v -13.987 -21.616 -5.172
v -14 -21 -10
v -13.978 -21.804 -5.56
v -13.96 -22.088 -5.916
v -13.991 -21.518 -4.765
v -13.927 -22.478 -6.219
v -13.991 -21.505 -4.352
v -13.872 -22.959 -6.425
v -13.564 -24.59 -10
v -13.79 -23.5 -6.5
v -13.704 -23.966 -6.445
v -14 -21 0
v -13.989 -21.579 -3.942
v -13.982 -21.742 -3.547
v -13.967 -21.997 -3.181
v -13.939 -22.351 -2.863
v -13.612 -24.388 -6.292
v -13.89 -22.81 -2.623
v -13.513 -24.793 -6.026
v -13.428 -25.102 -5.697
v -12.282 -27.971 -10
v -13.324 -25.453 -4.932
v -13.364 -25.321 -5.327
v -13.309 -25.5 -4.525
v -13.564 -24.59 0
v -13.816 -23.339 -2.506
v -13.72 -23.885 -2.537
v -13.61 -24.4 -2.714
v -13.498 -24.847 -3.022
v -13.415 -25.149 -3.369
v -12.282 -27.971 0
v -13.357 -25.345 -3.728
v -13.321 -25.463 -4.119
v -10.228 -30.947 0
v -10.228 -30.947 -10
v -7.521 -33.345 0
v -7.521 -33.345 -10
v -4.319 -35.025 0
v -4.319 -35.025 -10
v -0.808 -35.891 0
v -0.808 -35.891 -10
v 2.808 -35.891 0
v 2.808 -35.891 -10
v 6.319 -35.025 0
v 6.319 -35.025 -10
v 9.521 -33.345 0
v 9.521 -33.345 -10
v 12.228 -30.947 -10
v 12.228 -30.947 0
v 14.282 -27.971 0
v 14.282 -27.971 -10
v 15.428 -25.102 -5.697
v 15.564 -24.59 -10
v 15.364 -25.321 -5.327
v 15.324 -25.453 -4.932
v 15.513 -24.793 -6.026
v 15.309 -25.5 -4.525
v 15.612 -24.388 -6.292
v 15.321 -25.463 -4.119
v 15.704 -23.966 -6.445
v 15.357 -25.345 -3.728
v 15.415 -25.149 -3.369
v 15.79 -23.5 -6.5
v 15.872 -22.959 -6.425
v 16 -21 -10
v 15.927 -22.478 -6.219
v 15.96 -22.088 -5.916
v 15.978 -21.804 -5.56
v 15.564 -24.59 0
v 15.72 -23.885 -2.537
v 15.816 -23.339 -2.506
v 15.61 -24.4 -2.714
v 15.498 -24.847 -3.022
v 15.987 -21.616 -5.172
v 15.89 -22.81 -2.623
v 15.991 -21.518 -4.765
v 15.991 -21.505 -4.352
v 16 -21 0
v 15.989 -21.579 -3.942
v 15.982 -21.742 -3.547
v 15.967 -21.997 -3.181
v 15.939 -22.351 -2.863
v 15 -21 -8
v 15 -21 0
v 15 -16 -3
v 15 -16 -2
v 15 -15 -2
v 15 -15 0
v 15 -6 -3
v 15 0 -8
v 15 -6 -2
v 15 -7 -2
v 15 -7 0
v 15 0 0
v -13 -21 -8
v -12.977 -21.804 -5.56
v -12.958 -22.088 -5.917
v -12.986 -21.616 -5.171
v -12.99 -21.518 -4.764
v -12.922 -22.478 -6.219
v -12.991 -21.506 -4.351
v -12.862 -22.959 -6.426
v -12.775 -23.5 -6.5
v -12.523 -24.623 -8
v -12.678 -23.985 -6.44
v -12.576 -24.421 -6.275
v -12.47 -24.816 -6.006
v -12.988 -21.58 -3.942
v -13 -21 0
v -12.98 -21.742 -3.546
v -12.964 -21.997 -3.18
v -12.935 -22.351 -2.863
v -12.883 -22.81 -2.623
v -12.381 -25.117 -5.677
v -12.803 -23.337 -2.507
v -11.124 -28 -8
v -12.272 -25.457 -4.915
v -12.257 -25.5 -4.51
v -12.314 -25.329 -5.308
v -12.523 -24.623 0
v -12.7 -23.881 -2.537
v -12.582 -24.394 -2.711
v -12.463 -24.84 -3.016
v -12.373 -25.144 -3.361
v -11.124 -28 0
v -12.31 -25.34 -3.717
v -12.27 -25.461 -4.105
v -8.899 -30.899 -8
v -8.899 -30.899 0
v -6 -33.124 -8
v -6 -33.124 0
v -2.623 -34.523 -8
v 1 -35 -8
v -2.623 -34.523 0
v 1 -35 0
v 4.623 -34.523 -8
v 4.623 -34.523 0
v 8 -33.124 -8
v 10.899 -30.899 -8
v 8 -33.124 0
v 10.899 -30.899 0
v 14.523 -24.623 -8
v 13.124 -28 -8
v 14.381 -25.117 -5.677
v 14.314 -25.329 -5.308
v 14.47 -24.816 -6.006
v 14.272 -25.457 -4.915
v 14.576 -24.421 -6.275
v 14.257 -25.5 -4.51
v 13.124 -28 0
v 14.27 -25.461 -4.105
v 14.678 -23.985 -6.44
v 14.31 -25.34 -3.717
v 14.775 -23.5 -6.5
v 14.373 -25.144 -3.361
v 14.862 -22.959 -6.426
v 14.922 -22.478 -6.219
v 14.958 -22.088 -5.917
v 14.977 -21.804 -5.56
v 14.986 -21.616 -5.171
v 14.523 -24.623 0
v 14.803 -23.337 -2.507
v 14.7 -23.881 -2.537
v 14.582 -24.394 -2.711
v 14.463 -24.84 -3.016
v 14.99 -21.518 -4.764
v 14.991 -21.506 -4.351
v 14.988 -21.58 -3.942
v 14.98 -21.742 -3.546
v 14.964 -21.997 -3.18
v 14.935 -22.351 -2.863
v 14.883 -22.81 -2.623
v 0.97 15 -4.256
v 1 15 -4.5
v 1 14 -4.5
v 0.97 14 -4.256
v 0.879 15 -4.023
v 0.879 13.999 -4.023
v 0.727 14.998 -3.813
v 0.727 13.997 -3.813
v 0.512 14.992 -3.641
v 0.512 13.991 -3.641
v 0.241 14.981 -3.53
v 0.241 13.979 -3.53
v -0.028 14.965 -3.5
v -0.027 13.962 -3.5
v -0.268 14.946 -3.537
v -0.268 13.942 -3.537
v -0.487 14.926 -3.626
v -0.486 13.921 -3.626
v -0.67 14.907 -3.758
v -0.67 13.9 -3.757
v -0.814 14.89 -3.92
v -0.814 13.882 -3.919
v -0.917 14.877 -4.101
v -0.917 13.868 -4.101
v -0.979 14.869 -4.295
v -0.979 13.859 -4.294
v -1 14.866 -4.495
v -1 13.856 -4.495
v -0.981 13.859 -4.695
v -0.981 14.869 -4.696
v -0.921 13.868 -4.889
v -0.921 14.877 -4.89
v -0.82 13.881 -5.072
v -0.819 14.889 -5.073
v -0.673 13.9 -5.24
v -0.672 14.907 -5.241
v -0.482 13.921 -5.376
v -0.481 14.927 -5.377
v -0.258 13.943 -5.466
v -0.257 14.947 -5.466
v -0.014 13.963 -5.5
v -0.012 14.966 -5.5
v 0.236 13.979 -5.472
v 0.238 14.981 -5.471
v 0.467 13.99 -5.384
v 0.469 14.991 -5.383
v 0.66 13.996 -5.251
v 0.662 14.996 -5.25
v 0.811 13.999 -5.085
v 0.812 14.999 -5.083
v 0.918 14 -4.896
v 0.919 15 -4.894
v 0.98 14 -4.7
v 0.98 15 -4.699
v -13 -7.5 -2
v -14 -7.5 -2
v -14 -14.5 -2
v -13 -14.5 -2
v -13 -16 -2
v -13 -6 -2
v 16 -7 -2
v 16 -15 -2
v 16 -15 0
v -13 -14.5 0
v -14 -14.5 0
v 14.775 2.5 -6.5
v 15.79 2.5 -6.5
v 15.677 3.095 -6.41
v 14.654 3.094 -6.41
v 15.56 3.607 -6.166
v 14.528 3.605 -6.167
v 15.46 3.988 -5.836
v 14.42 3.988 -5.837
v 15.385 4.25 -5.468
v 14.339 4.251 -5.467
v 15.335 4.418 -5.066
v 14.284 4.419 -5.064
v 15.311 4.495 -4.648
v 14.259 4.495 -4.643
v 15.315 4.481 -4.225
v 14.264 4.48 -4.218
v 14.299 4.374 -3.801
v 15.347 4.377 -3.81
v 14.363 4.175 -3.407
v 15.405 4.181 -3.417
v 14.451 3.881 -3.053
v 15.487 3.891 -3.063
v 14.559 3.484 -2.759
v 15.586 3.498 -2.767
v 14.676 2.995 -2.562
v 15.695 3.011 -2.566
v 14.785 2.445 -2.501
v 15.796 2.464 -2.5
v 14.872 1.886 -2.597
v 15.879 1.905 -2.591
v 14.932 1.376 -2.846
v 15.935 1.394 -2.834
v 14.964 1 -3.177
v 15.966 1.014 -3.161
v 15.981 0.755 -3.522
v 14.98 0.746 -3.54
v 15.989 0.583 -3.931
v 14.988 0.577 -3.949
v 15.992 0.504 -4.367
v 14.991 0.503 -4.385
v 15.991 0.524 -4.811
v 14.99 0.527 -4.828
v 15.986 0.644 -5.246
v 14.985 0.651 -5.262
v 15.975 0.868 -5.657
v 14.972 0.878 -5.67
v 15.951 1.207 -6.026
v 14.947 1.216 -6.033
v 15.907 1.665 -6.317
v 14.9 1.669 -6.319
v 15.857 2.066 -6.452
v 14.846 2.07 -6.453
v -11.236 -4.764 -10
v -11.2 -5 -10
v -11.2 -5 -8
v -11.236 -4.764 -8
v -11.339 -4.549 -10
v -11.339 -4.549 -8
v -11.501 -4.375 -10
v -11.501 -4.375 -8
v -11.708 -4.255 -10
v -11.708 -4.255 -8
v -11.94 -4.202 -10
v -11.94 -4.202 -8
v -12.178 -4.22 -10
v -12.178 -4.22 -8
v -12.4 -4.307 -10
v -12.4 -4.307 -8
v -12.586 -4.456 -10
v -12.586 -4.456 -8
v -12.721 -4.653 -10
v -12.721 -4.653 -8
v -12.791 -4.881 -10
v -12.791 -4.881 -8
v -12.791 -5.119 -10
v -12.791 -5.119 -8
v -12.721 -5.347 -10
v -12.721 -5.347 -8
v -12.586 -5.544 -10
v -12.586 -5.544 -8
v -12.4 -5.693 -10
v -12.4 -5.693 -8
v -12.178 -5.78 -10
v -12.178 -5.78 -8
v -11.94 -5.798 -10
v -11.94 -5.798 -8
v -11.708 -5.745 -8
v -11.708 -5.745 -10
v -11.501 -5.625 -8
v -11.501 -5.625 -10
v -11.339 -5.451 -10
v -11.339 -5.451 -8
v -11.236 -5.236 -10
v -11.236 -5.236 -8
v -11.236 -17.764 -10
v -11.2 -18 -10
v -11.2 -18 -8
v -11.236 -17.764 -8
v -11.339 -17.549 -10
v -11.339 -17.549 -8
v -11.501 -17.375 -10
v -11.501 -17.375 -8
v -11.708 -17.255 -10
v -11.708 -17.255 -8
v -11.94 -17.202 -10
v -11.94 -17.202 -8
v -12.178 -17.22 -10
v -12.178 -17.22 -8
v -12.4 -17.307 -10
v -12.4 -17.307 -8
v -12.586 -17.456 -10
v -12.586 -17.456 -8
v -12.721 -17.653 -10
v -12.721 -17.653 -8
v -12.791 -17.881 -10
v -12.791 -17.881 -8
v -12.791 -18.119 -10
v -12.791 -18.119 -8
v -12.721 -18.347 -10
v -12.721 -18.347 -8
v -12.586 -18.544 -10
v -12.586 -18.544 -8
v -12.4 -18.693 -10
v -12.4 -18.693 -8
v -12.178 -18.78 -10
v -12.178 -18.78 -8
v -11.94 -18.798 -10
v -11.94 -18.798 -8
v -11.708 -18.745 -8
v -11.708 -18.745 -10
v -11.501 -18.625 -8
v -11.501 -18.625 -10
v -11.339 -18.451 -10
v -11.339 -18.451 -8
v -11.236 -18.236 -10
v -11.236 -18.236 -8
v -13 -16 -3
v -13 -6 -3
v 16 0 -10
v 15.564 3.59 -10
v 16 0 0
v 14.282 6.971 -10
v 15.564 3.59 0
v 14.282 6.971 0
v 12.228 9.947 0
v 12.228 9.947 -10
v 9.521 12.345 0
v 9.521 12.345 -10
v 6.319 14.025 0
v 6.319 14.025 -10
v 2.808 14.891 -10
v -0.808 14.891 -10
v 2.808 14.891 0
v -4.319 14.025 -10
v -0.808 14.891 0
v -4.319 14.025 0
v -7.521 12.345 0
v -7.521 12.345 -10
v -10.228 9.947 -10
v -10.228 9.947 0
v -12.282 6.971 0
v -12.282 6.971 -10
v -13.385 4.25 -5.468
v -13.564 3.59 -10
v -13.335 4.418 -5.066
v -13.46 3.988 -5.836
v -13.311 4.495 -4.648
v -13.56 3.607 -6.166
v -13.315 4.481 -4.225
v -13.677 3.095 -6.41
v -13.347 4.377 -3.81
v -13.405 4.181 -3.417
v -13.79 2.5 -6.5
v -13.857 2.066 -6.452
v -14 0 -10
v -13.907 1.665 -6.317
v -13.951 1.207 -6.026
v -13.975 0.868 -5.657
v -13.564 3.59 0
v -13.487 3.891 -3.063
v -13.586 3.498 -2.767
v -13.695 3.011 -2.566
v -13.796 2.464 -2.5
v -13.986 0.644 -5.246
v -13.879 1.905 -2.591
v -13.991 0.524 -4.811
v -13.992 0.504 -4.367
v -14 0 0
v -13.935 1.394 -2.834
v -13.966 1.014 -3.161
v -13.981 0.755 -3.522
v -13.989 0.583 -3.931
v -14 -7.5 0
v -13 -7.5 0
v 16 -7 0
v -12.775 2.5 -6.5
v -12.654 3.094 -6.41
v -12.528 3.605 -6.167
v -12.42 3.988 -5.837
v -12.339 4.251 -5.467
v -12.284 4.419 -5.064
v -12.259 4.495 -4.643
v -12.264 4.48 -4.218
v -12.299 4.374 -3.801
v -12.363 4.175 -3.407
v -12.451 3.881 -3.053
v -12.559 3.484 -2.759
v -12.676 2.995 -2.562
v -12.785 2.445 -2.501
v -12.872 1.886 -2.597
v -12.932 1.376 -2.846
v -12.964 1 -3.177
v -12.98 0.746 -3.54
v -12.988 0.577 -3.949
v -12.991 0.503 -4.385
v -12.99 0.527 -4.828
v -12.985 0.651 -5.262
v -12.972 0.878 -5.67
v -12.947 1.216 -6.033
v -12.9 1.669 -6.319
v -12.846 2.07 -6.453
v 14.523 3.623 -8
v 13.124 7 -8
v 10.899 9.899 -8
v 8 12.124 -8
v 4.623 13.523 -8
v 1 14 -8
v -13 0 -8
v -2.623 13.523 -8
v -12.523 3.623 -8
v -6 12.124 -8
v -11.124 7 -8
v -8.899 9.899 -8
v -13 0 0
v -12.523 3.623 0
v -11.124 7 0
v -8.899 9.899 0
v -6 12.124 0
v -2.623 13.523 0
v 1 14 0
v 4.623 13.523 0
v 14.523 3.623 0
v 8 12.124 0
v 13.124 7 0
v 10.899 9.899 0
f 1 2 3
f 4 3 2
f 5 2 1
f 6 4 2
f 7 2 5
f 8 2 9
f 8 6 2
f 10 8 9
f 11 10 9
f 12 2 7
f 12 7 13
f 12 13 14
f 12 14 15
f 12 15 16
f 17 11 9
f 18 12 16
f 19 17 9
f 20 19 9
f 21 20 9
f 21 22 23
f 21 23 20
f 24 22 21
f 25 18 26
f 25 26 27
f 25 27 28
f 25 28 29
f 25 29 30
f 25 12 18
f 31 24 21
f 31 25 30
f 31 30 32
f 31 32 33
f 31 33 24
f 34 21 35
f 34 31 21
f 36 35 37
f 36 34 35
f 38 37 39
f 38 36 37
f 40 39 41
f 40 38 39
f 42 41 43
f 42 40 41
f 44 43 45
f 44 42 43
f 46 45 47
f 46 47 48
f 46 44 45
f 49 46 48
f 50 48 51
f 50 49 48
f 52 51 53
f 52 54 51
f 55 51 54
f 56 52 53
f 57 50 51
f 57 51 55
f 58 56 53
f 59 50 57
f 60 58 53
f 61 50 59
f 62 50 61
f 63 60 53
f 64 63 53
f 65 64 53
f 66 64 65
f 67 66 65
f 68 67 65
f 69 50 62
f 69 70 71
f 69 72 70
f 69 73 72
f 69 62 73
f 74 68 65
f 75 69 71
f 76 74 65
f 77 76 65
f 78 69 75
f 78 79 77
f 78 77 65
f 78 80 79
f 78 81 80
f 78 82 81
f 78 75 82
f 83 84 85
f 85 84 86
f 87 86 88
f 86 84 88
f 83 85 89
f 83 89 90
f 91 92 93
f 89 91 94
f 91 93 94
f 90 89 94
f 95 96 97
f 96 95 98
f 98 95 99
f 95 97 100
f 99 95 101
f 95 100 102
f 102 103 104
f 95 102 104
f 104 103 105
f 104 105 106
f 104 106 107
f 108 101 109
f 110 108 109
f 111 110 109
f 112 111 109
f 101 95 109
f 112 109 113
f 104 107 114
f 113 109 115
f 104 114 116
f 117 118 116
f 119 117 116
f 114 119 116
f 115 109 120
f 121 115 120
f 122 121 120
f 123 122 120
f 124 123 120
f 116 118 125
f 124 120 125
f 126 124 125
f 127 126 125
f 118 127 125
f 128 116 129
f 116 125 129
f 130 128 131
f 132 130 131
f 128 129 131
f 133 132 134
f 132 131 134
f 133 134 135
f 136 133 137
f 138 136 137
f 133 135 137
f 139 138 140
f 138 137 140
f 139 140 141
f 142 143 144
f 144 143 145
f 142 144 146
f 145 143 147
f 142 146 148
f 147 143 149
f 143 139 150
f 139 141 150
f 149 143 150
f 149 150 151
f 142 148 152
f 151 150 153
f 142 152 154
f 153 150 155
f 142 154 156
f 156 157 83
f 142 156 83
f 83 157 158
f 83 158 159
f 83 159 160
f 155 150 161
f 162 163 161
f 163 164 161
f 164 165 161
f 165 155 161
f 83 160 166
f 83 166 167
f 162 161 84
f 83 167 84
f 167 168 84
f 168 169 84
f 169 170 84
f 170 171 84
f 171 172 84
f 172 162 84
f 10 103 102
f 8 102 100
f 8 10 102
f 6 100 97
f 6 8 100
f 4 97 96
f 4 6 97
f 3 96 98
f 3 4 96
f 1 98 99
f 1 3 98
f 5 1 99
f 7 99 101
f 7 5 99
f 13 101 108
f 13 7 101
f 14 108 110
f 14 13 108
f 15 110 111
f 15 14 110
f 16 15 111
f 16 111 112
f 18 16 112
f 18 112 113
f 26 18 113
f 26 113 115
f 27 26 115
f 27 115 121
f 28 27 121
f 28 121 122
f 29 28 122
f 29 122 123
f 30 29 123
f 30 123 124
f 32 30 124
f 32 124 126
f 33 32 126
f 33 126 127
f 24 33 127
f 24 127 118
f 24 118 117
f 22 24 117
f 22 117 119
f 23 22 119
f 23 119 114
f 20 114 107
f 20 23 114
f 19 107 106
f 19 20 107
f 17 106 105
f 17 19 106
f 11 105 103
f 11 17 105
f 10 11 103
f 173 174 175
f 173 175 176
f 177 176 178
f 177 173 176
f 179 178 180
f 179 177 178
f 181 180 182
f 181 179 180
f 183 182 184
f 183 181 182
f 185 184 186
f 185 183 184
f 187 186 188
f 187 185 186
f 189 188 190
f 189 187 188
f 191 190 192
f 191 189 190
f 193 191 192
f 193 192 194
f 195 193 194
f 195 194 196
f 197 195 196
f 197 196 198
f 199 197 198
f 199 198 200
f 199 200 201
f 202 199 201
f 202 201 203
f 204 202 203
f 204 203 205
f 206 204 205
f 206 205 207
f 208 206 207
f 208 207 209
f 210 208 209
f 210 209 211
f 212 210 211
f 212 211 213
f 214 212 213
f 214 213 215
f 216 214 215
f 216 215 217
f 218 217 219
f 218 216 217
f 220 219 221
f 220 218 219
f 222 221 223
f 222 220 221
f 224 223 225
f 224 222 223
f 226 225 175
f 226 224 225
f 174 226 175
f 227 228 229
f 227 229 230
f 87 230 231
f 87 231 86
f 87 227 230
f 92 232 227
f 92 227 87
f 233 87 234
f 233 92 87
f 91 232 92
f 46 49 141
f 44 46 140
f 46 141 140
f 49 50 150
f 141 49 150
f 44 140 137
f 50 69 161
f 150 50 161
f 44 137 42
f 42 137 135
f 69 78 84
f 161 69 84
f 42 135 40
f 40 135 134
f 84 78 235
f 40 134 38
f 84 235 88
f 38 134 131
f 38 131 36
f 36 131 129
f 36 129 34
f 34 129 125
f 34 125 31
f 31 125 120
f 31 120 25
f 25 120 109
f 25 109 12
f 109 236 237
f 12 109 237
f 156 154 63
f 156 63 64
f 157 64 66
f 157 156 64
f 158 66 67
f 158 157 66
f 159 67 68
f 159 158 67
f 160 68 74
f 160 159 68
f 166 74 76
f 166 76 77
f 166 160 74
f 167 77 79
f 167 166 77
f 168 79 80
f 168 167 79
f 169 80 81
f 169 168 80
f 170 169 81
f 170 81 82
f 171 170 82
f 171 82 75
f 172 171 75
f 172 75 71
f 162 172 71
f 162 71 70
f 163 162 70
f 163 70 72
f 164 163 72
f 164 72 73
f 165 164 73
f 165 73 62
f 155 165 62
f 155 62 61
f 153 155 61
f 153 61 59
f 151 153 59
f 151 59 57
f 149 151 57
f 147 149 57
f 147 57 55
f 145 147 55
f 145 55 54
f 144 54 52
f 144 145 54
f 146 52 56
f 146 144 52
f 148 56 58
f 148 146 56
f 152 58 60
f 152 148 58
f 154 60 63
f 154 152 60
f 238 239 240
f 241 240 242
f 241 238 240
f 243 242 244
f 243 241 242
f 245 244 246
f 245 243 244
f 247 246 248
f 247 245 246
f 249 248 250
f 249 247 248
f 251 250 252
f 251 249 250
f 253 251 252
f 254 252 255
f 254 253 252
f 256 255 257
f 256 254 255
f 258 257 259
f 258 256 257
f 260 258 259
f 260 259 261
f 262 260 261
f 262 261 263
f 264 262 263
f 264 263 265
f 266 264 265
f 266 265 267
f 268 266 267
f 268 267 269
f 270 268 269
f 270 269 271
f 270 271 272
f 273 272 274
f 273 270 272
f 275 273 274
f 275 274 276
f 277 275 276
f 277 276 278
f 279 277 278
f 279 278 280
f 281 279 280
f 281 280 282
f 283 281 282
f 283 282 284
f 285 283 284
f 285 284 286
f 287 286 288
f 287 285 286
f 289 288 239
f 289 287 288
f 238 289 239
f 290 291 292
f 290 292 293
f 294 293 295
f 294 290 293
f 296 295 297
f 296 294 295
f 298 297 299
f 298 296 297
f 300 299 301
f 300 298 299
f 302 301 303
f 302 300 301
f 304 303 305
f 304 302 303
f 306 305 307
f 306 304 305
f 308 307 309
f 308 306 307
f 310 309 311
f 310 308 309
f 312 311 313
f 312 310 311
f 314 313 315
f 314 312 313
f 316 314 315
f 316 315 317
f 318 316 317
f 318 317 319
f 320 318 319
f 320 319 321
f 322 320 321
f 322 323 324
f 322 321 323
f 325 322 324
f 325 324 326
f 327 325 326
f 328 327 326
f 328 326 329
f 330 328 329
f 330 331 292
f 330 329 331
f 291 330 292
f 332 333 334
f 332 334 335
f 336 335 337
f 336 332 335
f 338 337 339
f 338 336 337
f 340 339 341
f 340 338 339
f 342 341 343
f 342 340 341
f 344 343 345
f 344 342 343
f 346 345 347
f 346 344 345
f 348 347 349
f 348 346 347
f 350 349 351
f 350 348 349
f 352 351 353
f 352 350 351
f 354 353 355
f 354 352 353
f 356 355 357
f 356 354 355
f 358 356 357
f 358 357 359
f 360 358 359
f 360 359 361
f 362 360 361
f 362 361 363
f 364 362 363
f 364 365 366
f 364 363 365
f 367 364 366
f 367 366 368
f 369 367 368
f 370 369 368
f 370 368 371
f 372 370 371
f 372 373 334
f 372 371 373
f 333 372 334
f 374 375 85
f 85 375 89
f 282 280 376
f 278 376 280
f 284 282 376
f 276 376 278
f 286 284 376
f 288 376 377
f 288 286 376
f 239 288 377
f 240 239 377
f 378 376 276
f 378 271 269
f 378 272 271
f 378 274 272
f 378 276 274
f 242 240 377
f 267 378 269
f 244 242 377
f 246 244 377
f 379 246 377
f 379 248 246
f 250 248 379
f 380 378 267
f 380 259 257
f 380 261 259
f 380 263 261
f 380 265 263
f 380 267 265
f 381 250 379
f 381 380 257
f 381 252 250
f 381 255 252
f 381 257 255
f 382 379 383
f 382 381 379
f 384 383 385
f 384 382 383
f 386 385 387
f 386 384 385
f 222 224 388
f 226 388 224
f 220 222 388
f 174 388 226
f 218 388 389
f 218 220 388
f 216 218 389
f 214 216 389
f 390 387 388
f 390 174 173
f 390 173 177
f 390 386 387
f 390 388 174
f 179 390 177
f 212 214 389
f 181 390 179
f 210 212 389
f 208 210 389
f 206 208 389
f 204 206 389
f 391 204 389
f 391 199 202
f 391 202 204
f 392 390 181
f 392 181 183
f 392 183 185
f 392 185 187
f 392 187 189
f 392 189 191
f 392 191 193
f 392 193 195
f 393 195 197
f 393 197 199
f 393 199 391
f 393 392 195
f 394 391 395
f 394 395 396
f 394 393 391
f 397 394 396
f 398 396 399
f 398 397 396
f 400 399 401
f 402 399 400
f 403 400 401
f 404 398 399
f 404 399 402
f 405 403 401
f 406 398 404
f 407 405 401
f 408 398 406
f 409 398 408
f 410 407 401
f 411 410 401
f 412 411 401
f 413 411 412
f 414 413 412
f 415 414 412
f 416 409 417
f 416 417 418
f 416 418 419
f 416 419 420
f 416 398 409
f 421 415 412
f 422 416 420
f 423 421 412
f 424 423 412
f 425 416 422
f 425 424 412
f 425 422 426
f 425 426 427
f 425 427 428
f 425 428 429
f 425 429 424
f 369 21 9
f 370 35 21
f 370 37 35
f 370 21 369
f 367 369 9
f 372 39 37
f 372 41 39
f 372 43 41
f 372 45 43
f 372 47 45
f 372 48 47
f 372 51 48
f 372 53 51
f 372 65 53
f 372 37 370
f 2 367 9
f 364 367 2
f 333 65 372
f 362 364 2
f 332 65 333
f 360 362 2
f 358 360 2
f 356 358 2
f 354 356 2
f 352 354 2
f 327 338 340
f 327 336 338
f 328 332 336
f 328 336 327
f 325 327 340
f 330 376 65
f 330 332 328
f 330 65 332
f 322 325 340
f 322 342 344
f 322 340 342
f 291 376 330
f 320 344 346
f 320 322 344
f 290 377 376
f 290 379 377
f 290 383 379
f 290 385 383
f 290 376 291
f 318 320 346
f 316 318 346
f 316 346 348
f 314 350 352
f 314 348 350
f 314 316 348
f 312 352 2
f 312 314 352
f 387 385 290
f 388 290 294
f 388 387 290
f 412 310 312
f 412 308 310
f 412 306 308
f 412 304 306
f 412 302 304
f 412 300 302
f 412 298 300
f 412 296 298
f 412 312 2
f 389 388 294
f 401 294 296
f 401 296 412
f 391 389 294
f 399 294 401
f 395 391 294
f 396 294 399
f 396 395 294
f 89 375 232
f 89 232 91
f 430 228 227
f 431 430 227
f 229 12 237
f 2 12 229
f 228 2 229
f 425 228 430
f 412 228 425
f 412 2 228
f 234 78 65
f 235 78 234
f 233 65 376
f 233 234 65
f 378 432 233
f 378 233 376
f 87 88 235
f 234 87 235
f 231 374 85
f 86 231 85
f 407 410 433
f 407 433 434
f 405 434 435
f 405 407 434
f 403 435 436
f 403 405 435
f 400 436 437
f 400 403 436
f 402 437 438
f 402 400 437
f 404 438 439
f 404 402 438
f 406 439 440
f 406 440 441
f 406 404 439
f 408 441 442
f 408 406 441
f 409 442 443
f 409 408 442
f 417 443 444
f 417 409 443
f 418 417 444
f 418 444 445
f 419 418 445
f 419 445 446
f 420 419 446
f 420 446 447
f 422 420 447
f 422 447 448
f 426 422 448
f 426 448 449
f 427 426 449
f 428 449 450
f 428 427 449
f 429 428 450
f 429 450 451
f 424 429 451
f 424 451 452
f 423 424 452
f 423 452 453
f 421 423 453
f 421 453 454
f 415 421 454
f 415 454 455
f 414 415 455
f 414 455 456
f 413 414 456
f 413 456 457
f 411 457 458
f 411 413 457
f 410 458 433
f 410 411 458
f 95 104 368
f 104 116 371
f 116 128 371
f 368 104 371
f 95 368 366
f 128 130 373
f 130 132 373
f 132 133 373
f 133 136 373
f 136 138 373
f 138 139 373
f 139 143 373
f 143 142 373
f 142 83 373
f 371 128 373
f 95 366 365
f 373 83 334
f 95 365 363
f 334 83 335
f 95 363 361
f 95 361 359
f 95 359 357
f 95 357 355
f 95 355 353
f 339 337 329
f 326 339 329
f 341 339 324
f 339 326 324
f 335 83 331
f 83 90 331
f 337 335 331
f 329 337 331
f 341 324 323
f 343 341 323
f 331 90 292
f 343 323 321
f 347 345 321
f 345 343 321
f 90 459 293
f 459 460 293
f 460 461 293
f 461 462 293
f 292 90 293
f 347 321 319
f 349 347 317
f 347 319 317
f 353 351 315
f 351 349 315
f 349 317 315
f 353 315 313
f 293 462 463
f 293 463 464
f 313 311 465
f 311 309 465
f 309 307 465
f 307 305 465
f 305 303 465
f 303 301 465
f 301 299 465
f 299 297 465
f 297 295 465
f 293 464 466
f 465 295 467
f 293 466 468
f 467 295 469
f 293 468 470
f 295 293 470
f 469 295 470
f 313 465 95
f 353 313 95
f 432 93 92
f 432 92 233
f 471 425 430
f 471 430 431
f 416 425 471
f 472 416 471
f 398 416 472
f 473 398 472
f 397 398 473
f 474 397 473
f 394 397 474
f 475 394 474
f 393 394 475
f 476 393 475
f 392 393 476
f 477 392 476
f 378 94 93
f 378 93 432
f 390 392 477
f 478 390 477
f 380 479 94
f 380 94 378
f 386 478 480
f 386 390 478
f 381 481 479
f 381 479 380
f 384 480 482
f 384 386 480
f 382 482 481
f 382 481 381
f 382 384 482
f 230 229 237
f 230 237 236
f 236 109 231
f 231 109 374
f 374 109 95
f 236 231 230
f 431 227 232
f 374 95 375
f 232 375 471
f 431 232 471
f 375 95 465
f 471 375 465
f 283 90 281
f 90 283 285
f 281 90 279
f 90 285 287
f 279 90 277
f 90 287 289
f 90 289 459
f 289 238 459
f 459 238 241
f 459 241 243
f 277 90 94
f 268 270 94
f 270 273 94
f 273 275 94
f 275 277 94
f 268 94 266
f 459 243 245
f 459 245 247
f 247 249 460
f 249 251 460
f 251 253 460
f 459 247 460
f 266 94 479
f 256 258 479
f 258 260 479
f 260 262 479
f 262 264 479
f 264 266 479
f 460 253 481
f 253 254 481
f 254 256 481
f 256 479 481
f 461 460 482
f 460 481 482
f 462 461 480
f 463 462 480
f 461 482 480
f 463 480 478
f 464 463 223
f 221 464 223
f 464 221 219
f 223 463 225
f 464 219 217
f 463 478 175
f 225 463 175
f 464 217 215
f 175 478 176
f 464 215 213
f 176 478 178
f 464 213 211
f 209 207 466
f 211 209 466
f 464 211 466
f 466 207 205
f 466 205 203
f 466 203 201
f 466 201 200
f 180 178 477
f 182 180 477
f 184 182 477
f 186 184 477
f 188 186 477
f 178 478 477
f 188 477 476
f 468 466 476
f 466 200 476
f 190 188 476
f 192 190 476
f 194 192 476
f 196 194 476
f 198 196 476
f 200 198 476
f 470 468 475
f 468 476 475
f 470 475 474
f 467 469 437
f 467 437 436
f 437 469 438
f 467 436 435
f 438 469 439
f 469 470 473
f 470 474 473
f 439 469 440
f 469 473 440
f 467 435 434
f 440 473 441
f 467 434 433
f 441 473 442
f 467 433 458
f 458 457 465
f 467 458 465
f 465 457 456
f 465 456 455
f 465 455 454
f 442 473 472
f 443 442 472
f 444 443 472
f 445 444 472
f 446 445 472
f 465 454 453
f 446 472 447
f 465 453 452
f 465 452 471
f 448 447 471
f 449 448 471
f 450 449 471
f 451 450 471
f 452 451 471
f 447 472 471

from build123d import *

# Parameters (mm, degrees)
CYLINDER053_R           = 0.8
CYLINDER053_DEPTH       = 10
CYLINDER052_R           = 0.8
CYLINDER052_DEPTH       = 10
BOX056_W                = 1
BOX056_H                = 1
BOX056_DEPTH            = 2
BOX057_W                = 1
BOX057_H                = 1
BOX057_DEPTH            = 2
CYLINDER037_R           = 1
CYLINDER037_DEPTH       = 10
CYLINDER037_ROLL_ANGLE  = 90
CYLINDER029_R           = 2
CYLINDER029_DEPTH       = 10
CYLINDER029_PITCH_ANGLE = 90
CYLINDER031_R           = 2
CYLINDER031_DEPTH       = 10
CYLINDER031_PITCH_ANGLE = 90
CYLINDER030_R           = 2
CYLINDER030_DEPTH       = 10
CYLINDER030_PITCH_ANGLE = 90
CYLINDER028_R           = 2
CYLINDER028_DEPTH       = 10
CYLINDER028_PITCH_ANGLE = 90
BOX012_W                = 33
BOX012_H                = 8
BOX012_DEPTH            = 2
CYLINDER002_W           = 14
CYLINDER002_H           = 8
CYLINDER002_ANGLE       = 180
CYLINDER001_W           = 15
CYLINDER001_H           = 10
CYLINDER001_ANGLE       = 180
CYLINDER003_W           = 14
CYLINDER003_H           = 8
CYLINDER003_ANGLE       = 180
CYLINDER_W              = 15
CYLINDER_H              = 10
CYLINDER_ANGLE          = 180
BOX001_W                = 28
BOX001_H                = 21
BOX001_DEPTH            = 8
BOX_W                   = 30
BOX_H                   = 21
BOX_DEPTH               = 10
FUSION_PLACEMENT_ANGLE  = 180
BOX013_W                = 28
BOX013_H                = 10
BOX013_DEPTH            = 2
BOX011_W                = 28
BOX011_H                = 10
BOX011_DEPTH            = 3


with BuildPart() as cilindro053:
    # Cylinder053 → Cylinder053 (new body)
    with BuildSketch(Plane(origin=(-12, -18, -17), x_dir=(1, 0, 0), z_dir=(0, 0, 1))):
        Circle(CYLINDER053_R)
    extrude(amount=CYLINDER053_DEPTH)


with BuildPart() as cilindro052:
    # Cylinder052 → Cylinder052 (new body)
    with BuildSketch(Plane(origin=(-12, -5, -17), x_dir=(1, 0, 0), z_dir=(0, 0, 1))):
        Circle(CYLINDER052_R)
    extrude(amount=CYLINDER052_DEPTH)


with BuildPart() as cubo056:
    # Box056 → Box056 (new body)
    with BuildSketch(Plane(origin=(-14, -7.5, -2), x_dir=(1, 0, 0), z_dir=(0, 0, 1))):
        with Locations((0.5, 0.5)):
            Rectangle(BOX056_W, BOX056_H)
    extrude(amount=BOX056_DEPTH)


with BuildPart() as cubo057:
    # Box057 → Box057 (new body)
    with BuildSketch(Plane(origin=(-14, -15.5, -2), x_dir=(1, 0, 0), z_dir=(0, 0, 1))):
        with Locations((0.5, 0.5)):
            Rectangle(BOX057_W, BOX057_H)
    extrude(amount=BOX057_DEPTH)


with BuildPart() as cilindro037:
    # Cylinder037 → Cylinder037 (new body)
    with BuildSketch(Plane.XY):
        Circle(CYLINDER037_R)
    extrude(amount=CYLINDER037_DEPTH)


with BuildPart() as cilindro037_1:
    # Cylinder037 roll: moved
    add(cilindro037.part.rotate(Axis((0, 0, 0), (1, 0, 0)), CYLINDER037_ROLL_ANGLE))


with BuildPart() as cilindro037_2:
    # Cylinder037 placement: moved
    add(cilindro037_1.part.moved(Location((-14, 89, 39.5))))


with BuildPart() as cilindro029:
    # Cylinder029 → Cylinder029 (new body)
    with BuildSketch(Plane.XY):
        Circle(CYLINDER029_R)
    extrude(amount=CYLINDER029_DEPTH)


with BuildPart() as cilindro029_1:
    # Cylinder029 pitch: moved
    add(cilindro029.part.rotate(Axis((0, 0, 0), (0, 1, 0)), CYLINDER029_PITCH_ANGLE))


with BuildPart() as cilindro029_2:
    # Cylinder029 placement: moved
    add(cilindro029_1.part.moved(Location((-29, 46.5, 39.5))))


with BuildPart() as cilindro031:
    # Cylinder031 → Cylinder031 (new body)
    with BuildSketch(Plane.XY):
        Circle(CYLINDER031_R)
    extrude(amount=CYLINDER031_DEPTH)


with BuildPart() as cilindro031_1:
    # Cylinder031 pitch: moved
    add(cilindro031.part.rotate(Axis((0, 0, 0), (0, 1, 0)), CYLINDER031_PITCH_ANGLE))


with BuildPart() as cilindro031_2:
    # Cylinder031 placement: moved
    add(cilindro031_1.part.moved(Location((-5, 72.5, 39.5))))


with BuildPart() as cilindro030:
    # Cylinder030 → Cylinder030 (new body)
    with BuildSketch(Plane.XY):
        Circle(CYLINDER030_R)
    extrude(amount=CYLINDER030_DEPTH)


with BuildPart() as cilindro030_1:
    # Cylinder030 pitch: moved
    add(cilindro030.part.rotate(Axis((0, 0, 0), (0, 1, 0)), CYLINDER030_PITCH_ANGLE))


with BuildPart() as cilindro030_2:
    # Cylinder030 placement: moved
    add(cilindro030_1.part.moved(Location((-5, 46.5, 39.5))))


with BuildPart() as cilindro028:
    # Cylinder028 → Cylinder028 (new body)
    with BuildSketch(Plane.XY):
        Circle(CYLINDER028_R)
    extrude(amount=CYLINDER028_DEPTH)


with BuildPart() as cilindro028_1:
    # Cylinder028 pitch: moved
    add(cilindro028.part.rotate(Axis((0, 0, 0), (0, 1, 0)), CYLINDER028_PITCH_ANGLE))


with BuildPart() as cilindro028_2:
    # Cylinder028 placement: moved
    add(cilindro028_1.part.moved(Location((-29, 72.5, 39.5))))


with BuildPart() as cubo012:
    # Box012 → Box012 (new body)
    with BuildSketch(Plane(origin=(-30, 55, 42), x_dir=(1, 0, 0), z_dir=(0, 0, 1))):
        with Locations((16.5, 4)):
            Rectangle(BOX012_W, BOX012_H)
    extrude(amount=BOX012_DEPTH)


with BuildPart() as cilindro002:
    # Cylinder002 → Cylinder002 (revolve)
    with BuildSketch(Plane(origin=(16, 49, -36), x_dir=(1, 0, 0), z_dir=(0, 1, 0))):
        with Locations((7, 4)):
            Rectangle(CYLINDER002_W, CYLINDER002_H)
    revolve(axis=Axis((16, 49, -36), (0, 0, -1)), revolution_arc=CYLINDER002_ANGLE)


with BuildPart() as cut001:
    # Cylinder001 → Cylinder001 (revolve)
    with BuildSketch(Plane(origin=(16, 49, -34), x_dir=(1, 0, 0), z_dir=(0, 1, 0))):
        with Locations((7.5, 5)):
            Rectangle(CYLINDER001_W, CYLINDER001_H)
    revolve(axis=Axis((16, 49, -34), (0, 0, -1)), revolution_arc=CYLINDER001_ANGLE)

    # Cut001: cut Cilindro002
    add(cilindro002.part, mode=Mode.SUBTRACT)


with BuildPart() as cut001_1:
    # Cut001 placement: moved
    add(cut001.part.moved(Location((-3, 0, 0))))


with BuildPart() as cilindro003:
    # Cylinder003 → Cylinder003 (revolve)
    with BuildSketch(Plane(origin=(13, 70, -36), x_dir=(-1, 0, 0), z_dir=(0, -1, 0))):
        with Locations((7, 4)):
            Rectangle(CYLINDER003_W, CYLINDER003_H)
    revolve(axis=Axis((13, 70, -36), (0, 0, -1)), revolution_arc=CYLINDER003_ANGLE)


with BuildPart() as cut002:
    # Cylinder → Cylinder (revolve)
    with BuildSketch(Plane(origin=(13, 70, -34), x_dir=(-1, 0, 0), z_dir=(0, -1, 0))):
        with Locations((7.5, 5)):
            Rectangle(CYLINDER_W, CYLINDER_H)
    revolve(axis=Axis((13, 70, -34), (0, 0, -1)), revolution_arc=CYLINDER_ANGLE)

    # Cut002: cut Cilindro003
    add(cilindro003.part, mode=Mode.SUBTRACT)


with BuildPart() as cubo001:
    # Box001 → Box001 (new body)
    with BuildSketch(Plane(origin=(-1, 49, -44), x_dir=(1, 0, 0), z_dir=(0, 0, 1))):
        with Locations((14, 10.5)):
            Rectangle(BOX001_W, BOX001_H)
    extrude(amount=BOX001_DEPTH)


with BuildPart() as cut058:
    # Box → Box (new body)
    with BuildSketch(Plane(origin=(-2, 49, -44), x_dir=(1, 0, 0), z_dir=(0, 0, 1))):
        with Locations((15, 10.5)):
            Rectangle(BOX_W, BOX_H)
    extrude(amount=BOX_DEPTH)

    # Cut: cut Cubo001
    add(cubo001.part, mode=Mode.SUBTRACT)

    # Fusion: union Cut001, Cut002
    add(cut001_1.part)
    add(cut002.part)


with BuildPart() as cut058_1:
    # Fusion placement: moved
    add(cut058.part.rotate(Axis((0, 0, 0), (0, 1, 0)), FUSION_PLACEMENT_ANGLE))

    # Cut003: cut Cubo012
    add(cubo012.part, mode=Mode.SUBTRACT)

    # Cut040: cut Cilindro028
    add(cilindro028_2.part, mode=Mode.SUBTRACT)

    # Cut041: cut Cilindro030
    add(cilindro030_2.part, mode=Mode.SUBTRACT)

    # Cut042: cut Cilindro031
    add(cilindro031_2.part, mode=Mode.SUBTRACT)

    # Cut043: cut Cilindro029
    add(cilindro029_2.part, mode=Mode.SUBTRACT)

    # Cut058: cut Cilindro037
    add(cilindro037_2.part, mode=Mode.SUBTRACT)


with BuildPart() as cubo013:
    # Box013 → Box013 (new body)
    with BuildSketch(Plane(origin=(-27, 54, 42), x_dir=(1, 0, 0), z_dir=(0, 0, 1))):
        with Locations((14, 5)):
            Rectangle(BOX013_W, BOX013_H)
    extrude(amount=BOX013_DEPTH)


with BuildPart() as cut077:
    # Box011 → Box011 (new body)
    with BuildSketch(Plane(origin=(-27, 54, 41), x_dir=(1, 0, 0), z_dir=(0, 0, 1))):
        with Locations((14, 5)):
            Rectangle(BOX011_W, BOX011_H)
    extrude(amount=BOX011_DEPTH)

    # Cut004: cut Cubo013
    add(cubo013.part, mode=Mode.SUBTRACT)

    # Fusion002022: union Cut058
    add(cut058_1.part)


with BuildPart() as cut077_1:
    # Fusion002022 placement: moved
    add(cut077.part.moved(Location((14, -70, -44))))

    # Fusion002031: union Cubo056, Cubo057
    add(cubo056.part)
    add(cubo057.part)

    # Cut076: cut Cilindro052
    add(cilindro052.part, mode=Mode.SUBTRACT)

    # Cut077: cut Cilindro053
    add(cilindro053.part, mode=Mode.SUBTRACT)


solid = cut077_1.part
